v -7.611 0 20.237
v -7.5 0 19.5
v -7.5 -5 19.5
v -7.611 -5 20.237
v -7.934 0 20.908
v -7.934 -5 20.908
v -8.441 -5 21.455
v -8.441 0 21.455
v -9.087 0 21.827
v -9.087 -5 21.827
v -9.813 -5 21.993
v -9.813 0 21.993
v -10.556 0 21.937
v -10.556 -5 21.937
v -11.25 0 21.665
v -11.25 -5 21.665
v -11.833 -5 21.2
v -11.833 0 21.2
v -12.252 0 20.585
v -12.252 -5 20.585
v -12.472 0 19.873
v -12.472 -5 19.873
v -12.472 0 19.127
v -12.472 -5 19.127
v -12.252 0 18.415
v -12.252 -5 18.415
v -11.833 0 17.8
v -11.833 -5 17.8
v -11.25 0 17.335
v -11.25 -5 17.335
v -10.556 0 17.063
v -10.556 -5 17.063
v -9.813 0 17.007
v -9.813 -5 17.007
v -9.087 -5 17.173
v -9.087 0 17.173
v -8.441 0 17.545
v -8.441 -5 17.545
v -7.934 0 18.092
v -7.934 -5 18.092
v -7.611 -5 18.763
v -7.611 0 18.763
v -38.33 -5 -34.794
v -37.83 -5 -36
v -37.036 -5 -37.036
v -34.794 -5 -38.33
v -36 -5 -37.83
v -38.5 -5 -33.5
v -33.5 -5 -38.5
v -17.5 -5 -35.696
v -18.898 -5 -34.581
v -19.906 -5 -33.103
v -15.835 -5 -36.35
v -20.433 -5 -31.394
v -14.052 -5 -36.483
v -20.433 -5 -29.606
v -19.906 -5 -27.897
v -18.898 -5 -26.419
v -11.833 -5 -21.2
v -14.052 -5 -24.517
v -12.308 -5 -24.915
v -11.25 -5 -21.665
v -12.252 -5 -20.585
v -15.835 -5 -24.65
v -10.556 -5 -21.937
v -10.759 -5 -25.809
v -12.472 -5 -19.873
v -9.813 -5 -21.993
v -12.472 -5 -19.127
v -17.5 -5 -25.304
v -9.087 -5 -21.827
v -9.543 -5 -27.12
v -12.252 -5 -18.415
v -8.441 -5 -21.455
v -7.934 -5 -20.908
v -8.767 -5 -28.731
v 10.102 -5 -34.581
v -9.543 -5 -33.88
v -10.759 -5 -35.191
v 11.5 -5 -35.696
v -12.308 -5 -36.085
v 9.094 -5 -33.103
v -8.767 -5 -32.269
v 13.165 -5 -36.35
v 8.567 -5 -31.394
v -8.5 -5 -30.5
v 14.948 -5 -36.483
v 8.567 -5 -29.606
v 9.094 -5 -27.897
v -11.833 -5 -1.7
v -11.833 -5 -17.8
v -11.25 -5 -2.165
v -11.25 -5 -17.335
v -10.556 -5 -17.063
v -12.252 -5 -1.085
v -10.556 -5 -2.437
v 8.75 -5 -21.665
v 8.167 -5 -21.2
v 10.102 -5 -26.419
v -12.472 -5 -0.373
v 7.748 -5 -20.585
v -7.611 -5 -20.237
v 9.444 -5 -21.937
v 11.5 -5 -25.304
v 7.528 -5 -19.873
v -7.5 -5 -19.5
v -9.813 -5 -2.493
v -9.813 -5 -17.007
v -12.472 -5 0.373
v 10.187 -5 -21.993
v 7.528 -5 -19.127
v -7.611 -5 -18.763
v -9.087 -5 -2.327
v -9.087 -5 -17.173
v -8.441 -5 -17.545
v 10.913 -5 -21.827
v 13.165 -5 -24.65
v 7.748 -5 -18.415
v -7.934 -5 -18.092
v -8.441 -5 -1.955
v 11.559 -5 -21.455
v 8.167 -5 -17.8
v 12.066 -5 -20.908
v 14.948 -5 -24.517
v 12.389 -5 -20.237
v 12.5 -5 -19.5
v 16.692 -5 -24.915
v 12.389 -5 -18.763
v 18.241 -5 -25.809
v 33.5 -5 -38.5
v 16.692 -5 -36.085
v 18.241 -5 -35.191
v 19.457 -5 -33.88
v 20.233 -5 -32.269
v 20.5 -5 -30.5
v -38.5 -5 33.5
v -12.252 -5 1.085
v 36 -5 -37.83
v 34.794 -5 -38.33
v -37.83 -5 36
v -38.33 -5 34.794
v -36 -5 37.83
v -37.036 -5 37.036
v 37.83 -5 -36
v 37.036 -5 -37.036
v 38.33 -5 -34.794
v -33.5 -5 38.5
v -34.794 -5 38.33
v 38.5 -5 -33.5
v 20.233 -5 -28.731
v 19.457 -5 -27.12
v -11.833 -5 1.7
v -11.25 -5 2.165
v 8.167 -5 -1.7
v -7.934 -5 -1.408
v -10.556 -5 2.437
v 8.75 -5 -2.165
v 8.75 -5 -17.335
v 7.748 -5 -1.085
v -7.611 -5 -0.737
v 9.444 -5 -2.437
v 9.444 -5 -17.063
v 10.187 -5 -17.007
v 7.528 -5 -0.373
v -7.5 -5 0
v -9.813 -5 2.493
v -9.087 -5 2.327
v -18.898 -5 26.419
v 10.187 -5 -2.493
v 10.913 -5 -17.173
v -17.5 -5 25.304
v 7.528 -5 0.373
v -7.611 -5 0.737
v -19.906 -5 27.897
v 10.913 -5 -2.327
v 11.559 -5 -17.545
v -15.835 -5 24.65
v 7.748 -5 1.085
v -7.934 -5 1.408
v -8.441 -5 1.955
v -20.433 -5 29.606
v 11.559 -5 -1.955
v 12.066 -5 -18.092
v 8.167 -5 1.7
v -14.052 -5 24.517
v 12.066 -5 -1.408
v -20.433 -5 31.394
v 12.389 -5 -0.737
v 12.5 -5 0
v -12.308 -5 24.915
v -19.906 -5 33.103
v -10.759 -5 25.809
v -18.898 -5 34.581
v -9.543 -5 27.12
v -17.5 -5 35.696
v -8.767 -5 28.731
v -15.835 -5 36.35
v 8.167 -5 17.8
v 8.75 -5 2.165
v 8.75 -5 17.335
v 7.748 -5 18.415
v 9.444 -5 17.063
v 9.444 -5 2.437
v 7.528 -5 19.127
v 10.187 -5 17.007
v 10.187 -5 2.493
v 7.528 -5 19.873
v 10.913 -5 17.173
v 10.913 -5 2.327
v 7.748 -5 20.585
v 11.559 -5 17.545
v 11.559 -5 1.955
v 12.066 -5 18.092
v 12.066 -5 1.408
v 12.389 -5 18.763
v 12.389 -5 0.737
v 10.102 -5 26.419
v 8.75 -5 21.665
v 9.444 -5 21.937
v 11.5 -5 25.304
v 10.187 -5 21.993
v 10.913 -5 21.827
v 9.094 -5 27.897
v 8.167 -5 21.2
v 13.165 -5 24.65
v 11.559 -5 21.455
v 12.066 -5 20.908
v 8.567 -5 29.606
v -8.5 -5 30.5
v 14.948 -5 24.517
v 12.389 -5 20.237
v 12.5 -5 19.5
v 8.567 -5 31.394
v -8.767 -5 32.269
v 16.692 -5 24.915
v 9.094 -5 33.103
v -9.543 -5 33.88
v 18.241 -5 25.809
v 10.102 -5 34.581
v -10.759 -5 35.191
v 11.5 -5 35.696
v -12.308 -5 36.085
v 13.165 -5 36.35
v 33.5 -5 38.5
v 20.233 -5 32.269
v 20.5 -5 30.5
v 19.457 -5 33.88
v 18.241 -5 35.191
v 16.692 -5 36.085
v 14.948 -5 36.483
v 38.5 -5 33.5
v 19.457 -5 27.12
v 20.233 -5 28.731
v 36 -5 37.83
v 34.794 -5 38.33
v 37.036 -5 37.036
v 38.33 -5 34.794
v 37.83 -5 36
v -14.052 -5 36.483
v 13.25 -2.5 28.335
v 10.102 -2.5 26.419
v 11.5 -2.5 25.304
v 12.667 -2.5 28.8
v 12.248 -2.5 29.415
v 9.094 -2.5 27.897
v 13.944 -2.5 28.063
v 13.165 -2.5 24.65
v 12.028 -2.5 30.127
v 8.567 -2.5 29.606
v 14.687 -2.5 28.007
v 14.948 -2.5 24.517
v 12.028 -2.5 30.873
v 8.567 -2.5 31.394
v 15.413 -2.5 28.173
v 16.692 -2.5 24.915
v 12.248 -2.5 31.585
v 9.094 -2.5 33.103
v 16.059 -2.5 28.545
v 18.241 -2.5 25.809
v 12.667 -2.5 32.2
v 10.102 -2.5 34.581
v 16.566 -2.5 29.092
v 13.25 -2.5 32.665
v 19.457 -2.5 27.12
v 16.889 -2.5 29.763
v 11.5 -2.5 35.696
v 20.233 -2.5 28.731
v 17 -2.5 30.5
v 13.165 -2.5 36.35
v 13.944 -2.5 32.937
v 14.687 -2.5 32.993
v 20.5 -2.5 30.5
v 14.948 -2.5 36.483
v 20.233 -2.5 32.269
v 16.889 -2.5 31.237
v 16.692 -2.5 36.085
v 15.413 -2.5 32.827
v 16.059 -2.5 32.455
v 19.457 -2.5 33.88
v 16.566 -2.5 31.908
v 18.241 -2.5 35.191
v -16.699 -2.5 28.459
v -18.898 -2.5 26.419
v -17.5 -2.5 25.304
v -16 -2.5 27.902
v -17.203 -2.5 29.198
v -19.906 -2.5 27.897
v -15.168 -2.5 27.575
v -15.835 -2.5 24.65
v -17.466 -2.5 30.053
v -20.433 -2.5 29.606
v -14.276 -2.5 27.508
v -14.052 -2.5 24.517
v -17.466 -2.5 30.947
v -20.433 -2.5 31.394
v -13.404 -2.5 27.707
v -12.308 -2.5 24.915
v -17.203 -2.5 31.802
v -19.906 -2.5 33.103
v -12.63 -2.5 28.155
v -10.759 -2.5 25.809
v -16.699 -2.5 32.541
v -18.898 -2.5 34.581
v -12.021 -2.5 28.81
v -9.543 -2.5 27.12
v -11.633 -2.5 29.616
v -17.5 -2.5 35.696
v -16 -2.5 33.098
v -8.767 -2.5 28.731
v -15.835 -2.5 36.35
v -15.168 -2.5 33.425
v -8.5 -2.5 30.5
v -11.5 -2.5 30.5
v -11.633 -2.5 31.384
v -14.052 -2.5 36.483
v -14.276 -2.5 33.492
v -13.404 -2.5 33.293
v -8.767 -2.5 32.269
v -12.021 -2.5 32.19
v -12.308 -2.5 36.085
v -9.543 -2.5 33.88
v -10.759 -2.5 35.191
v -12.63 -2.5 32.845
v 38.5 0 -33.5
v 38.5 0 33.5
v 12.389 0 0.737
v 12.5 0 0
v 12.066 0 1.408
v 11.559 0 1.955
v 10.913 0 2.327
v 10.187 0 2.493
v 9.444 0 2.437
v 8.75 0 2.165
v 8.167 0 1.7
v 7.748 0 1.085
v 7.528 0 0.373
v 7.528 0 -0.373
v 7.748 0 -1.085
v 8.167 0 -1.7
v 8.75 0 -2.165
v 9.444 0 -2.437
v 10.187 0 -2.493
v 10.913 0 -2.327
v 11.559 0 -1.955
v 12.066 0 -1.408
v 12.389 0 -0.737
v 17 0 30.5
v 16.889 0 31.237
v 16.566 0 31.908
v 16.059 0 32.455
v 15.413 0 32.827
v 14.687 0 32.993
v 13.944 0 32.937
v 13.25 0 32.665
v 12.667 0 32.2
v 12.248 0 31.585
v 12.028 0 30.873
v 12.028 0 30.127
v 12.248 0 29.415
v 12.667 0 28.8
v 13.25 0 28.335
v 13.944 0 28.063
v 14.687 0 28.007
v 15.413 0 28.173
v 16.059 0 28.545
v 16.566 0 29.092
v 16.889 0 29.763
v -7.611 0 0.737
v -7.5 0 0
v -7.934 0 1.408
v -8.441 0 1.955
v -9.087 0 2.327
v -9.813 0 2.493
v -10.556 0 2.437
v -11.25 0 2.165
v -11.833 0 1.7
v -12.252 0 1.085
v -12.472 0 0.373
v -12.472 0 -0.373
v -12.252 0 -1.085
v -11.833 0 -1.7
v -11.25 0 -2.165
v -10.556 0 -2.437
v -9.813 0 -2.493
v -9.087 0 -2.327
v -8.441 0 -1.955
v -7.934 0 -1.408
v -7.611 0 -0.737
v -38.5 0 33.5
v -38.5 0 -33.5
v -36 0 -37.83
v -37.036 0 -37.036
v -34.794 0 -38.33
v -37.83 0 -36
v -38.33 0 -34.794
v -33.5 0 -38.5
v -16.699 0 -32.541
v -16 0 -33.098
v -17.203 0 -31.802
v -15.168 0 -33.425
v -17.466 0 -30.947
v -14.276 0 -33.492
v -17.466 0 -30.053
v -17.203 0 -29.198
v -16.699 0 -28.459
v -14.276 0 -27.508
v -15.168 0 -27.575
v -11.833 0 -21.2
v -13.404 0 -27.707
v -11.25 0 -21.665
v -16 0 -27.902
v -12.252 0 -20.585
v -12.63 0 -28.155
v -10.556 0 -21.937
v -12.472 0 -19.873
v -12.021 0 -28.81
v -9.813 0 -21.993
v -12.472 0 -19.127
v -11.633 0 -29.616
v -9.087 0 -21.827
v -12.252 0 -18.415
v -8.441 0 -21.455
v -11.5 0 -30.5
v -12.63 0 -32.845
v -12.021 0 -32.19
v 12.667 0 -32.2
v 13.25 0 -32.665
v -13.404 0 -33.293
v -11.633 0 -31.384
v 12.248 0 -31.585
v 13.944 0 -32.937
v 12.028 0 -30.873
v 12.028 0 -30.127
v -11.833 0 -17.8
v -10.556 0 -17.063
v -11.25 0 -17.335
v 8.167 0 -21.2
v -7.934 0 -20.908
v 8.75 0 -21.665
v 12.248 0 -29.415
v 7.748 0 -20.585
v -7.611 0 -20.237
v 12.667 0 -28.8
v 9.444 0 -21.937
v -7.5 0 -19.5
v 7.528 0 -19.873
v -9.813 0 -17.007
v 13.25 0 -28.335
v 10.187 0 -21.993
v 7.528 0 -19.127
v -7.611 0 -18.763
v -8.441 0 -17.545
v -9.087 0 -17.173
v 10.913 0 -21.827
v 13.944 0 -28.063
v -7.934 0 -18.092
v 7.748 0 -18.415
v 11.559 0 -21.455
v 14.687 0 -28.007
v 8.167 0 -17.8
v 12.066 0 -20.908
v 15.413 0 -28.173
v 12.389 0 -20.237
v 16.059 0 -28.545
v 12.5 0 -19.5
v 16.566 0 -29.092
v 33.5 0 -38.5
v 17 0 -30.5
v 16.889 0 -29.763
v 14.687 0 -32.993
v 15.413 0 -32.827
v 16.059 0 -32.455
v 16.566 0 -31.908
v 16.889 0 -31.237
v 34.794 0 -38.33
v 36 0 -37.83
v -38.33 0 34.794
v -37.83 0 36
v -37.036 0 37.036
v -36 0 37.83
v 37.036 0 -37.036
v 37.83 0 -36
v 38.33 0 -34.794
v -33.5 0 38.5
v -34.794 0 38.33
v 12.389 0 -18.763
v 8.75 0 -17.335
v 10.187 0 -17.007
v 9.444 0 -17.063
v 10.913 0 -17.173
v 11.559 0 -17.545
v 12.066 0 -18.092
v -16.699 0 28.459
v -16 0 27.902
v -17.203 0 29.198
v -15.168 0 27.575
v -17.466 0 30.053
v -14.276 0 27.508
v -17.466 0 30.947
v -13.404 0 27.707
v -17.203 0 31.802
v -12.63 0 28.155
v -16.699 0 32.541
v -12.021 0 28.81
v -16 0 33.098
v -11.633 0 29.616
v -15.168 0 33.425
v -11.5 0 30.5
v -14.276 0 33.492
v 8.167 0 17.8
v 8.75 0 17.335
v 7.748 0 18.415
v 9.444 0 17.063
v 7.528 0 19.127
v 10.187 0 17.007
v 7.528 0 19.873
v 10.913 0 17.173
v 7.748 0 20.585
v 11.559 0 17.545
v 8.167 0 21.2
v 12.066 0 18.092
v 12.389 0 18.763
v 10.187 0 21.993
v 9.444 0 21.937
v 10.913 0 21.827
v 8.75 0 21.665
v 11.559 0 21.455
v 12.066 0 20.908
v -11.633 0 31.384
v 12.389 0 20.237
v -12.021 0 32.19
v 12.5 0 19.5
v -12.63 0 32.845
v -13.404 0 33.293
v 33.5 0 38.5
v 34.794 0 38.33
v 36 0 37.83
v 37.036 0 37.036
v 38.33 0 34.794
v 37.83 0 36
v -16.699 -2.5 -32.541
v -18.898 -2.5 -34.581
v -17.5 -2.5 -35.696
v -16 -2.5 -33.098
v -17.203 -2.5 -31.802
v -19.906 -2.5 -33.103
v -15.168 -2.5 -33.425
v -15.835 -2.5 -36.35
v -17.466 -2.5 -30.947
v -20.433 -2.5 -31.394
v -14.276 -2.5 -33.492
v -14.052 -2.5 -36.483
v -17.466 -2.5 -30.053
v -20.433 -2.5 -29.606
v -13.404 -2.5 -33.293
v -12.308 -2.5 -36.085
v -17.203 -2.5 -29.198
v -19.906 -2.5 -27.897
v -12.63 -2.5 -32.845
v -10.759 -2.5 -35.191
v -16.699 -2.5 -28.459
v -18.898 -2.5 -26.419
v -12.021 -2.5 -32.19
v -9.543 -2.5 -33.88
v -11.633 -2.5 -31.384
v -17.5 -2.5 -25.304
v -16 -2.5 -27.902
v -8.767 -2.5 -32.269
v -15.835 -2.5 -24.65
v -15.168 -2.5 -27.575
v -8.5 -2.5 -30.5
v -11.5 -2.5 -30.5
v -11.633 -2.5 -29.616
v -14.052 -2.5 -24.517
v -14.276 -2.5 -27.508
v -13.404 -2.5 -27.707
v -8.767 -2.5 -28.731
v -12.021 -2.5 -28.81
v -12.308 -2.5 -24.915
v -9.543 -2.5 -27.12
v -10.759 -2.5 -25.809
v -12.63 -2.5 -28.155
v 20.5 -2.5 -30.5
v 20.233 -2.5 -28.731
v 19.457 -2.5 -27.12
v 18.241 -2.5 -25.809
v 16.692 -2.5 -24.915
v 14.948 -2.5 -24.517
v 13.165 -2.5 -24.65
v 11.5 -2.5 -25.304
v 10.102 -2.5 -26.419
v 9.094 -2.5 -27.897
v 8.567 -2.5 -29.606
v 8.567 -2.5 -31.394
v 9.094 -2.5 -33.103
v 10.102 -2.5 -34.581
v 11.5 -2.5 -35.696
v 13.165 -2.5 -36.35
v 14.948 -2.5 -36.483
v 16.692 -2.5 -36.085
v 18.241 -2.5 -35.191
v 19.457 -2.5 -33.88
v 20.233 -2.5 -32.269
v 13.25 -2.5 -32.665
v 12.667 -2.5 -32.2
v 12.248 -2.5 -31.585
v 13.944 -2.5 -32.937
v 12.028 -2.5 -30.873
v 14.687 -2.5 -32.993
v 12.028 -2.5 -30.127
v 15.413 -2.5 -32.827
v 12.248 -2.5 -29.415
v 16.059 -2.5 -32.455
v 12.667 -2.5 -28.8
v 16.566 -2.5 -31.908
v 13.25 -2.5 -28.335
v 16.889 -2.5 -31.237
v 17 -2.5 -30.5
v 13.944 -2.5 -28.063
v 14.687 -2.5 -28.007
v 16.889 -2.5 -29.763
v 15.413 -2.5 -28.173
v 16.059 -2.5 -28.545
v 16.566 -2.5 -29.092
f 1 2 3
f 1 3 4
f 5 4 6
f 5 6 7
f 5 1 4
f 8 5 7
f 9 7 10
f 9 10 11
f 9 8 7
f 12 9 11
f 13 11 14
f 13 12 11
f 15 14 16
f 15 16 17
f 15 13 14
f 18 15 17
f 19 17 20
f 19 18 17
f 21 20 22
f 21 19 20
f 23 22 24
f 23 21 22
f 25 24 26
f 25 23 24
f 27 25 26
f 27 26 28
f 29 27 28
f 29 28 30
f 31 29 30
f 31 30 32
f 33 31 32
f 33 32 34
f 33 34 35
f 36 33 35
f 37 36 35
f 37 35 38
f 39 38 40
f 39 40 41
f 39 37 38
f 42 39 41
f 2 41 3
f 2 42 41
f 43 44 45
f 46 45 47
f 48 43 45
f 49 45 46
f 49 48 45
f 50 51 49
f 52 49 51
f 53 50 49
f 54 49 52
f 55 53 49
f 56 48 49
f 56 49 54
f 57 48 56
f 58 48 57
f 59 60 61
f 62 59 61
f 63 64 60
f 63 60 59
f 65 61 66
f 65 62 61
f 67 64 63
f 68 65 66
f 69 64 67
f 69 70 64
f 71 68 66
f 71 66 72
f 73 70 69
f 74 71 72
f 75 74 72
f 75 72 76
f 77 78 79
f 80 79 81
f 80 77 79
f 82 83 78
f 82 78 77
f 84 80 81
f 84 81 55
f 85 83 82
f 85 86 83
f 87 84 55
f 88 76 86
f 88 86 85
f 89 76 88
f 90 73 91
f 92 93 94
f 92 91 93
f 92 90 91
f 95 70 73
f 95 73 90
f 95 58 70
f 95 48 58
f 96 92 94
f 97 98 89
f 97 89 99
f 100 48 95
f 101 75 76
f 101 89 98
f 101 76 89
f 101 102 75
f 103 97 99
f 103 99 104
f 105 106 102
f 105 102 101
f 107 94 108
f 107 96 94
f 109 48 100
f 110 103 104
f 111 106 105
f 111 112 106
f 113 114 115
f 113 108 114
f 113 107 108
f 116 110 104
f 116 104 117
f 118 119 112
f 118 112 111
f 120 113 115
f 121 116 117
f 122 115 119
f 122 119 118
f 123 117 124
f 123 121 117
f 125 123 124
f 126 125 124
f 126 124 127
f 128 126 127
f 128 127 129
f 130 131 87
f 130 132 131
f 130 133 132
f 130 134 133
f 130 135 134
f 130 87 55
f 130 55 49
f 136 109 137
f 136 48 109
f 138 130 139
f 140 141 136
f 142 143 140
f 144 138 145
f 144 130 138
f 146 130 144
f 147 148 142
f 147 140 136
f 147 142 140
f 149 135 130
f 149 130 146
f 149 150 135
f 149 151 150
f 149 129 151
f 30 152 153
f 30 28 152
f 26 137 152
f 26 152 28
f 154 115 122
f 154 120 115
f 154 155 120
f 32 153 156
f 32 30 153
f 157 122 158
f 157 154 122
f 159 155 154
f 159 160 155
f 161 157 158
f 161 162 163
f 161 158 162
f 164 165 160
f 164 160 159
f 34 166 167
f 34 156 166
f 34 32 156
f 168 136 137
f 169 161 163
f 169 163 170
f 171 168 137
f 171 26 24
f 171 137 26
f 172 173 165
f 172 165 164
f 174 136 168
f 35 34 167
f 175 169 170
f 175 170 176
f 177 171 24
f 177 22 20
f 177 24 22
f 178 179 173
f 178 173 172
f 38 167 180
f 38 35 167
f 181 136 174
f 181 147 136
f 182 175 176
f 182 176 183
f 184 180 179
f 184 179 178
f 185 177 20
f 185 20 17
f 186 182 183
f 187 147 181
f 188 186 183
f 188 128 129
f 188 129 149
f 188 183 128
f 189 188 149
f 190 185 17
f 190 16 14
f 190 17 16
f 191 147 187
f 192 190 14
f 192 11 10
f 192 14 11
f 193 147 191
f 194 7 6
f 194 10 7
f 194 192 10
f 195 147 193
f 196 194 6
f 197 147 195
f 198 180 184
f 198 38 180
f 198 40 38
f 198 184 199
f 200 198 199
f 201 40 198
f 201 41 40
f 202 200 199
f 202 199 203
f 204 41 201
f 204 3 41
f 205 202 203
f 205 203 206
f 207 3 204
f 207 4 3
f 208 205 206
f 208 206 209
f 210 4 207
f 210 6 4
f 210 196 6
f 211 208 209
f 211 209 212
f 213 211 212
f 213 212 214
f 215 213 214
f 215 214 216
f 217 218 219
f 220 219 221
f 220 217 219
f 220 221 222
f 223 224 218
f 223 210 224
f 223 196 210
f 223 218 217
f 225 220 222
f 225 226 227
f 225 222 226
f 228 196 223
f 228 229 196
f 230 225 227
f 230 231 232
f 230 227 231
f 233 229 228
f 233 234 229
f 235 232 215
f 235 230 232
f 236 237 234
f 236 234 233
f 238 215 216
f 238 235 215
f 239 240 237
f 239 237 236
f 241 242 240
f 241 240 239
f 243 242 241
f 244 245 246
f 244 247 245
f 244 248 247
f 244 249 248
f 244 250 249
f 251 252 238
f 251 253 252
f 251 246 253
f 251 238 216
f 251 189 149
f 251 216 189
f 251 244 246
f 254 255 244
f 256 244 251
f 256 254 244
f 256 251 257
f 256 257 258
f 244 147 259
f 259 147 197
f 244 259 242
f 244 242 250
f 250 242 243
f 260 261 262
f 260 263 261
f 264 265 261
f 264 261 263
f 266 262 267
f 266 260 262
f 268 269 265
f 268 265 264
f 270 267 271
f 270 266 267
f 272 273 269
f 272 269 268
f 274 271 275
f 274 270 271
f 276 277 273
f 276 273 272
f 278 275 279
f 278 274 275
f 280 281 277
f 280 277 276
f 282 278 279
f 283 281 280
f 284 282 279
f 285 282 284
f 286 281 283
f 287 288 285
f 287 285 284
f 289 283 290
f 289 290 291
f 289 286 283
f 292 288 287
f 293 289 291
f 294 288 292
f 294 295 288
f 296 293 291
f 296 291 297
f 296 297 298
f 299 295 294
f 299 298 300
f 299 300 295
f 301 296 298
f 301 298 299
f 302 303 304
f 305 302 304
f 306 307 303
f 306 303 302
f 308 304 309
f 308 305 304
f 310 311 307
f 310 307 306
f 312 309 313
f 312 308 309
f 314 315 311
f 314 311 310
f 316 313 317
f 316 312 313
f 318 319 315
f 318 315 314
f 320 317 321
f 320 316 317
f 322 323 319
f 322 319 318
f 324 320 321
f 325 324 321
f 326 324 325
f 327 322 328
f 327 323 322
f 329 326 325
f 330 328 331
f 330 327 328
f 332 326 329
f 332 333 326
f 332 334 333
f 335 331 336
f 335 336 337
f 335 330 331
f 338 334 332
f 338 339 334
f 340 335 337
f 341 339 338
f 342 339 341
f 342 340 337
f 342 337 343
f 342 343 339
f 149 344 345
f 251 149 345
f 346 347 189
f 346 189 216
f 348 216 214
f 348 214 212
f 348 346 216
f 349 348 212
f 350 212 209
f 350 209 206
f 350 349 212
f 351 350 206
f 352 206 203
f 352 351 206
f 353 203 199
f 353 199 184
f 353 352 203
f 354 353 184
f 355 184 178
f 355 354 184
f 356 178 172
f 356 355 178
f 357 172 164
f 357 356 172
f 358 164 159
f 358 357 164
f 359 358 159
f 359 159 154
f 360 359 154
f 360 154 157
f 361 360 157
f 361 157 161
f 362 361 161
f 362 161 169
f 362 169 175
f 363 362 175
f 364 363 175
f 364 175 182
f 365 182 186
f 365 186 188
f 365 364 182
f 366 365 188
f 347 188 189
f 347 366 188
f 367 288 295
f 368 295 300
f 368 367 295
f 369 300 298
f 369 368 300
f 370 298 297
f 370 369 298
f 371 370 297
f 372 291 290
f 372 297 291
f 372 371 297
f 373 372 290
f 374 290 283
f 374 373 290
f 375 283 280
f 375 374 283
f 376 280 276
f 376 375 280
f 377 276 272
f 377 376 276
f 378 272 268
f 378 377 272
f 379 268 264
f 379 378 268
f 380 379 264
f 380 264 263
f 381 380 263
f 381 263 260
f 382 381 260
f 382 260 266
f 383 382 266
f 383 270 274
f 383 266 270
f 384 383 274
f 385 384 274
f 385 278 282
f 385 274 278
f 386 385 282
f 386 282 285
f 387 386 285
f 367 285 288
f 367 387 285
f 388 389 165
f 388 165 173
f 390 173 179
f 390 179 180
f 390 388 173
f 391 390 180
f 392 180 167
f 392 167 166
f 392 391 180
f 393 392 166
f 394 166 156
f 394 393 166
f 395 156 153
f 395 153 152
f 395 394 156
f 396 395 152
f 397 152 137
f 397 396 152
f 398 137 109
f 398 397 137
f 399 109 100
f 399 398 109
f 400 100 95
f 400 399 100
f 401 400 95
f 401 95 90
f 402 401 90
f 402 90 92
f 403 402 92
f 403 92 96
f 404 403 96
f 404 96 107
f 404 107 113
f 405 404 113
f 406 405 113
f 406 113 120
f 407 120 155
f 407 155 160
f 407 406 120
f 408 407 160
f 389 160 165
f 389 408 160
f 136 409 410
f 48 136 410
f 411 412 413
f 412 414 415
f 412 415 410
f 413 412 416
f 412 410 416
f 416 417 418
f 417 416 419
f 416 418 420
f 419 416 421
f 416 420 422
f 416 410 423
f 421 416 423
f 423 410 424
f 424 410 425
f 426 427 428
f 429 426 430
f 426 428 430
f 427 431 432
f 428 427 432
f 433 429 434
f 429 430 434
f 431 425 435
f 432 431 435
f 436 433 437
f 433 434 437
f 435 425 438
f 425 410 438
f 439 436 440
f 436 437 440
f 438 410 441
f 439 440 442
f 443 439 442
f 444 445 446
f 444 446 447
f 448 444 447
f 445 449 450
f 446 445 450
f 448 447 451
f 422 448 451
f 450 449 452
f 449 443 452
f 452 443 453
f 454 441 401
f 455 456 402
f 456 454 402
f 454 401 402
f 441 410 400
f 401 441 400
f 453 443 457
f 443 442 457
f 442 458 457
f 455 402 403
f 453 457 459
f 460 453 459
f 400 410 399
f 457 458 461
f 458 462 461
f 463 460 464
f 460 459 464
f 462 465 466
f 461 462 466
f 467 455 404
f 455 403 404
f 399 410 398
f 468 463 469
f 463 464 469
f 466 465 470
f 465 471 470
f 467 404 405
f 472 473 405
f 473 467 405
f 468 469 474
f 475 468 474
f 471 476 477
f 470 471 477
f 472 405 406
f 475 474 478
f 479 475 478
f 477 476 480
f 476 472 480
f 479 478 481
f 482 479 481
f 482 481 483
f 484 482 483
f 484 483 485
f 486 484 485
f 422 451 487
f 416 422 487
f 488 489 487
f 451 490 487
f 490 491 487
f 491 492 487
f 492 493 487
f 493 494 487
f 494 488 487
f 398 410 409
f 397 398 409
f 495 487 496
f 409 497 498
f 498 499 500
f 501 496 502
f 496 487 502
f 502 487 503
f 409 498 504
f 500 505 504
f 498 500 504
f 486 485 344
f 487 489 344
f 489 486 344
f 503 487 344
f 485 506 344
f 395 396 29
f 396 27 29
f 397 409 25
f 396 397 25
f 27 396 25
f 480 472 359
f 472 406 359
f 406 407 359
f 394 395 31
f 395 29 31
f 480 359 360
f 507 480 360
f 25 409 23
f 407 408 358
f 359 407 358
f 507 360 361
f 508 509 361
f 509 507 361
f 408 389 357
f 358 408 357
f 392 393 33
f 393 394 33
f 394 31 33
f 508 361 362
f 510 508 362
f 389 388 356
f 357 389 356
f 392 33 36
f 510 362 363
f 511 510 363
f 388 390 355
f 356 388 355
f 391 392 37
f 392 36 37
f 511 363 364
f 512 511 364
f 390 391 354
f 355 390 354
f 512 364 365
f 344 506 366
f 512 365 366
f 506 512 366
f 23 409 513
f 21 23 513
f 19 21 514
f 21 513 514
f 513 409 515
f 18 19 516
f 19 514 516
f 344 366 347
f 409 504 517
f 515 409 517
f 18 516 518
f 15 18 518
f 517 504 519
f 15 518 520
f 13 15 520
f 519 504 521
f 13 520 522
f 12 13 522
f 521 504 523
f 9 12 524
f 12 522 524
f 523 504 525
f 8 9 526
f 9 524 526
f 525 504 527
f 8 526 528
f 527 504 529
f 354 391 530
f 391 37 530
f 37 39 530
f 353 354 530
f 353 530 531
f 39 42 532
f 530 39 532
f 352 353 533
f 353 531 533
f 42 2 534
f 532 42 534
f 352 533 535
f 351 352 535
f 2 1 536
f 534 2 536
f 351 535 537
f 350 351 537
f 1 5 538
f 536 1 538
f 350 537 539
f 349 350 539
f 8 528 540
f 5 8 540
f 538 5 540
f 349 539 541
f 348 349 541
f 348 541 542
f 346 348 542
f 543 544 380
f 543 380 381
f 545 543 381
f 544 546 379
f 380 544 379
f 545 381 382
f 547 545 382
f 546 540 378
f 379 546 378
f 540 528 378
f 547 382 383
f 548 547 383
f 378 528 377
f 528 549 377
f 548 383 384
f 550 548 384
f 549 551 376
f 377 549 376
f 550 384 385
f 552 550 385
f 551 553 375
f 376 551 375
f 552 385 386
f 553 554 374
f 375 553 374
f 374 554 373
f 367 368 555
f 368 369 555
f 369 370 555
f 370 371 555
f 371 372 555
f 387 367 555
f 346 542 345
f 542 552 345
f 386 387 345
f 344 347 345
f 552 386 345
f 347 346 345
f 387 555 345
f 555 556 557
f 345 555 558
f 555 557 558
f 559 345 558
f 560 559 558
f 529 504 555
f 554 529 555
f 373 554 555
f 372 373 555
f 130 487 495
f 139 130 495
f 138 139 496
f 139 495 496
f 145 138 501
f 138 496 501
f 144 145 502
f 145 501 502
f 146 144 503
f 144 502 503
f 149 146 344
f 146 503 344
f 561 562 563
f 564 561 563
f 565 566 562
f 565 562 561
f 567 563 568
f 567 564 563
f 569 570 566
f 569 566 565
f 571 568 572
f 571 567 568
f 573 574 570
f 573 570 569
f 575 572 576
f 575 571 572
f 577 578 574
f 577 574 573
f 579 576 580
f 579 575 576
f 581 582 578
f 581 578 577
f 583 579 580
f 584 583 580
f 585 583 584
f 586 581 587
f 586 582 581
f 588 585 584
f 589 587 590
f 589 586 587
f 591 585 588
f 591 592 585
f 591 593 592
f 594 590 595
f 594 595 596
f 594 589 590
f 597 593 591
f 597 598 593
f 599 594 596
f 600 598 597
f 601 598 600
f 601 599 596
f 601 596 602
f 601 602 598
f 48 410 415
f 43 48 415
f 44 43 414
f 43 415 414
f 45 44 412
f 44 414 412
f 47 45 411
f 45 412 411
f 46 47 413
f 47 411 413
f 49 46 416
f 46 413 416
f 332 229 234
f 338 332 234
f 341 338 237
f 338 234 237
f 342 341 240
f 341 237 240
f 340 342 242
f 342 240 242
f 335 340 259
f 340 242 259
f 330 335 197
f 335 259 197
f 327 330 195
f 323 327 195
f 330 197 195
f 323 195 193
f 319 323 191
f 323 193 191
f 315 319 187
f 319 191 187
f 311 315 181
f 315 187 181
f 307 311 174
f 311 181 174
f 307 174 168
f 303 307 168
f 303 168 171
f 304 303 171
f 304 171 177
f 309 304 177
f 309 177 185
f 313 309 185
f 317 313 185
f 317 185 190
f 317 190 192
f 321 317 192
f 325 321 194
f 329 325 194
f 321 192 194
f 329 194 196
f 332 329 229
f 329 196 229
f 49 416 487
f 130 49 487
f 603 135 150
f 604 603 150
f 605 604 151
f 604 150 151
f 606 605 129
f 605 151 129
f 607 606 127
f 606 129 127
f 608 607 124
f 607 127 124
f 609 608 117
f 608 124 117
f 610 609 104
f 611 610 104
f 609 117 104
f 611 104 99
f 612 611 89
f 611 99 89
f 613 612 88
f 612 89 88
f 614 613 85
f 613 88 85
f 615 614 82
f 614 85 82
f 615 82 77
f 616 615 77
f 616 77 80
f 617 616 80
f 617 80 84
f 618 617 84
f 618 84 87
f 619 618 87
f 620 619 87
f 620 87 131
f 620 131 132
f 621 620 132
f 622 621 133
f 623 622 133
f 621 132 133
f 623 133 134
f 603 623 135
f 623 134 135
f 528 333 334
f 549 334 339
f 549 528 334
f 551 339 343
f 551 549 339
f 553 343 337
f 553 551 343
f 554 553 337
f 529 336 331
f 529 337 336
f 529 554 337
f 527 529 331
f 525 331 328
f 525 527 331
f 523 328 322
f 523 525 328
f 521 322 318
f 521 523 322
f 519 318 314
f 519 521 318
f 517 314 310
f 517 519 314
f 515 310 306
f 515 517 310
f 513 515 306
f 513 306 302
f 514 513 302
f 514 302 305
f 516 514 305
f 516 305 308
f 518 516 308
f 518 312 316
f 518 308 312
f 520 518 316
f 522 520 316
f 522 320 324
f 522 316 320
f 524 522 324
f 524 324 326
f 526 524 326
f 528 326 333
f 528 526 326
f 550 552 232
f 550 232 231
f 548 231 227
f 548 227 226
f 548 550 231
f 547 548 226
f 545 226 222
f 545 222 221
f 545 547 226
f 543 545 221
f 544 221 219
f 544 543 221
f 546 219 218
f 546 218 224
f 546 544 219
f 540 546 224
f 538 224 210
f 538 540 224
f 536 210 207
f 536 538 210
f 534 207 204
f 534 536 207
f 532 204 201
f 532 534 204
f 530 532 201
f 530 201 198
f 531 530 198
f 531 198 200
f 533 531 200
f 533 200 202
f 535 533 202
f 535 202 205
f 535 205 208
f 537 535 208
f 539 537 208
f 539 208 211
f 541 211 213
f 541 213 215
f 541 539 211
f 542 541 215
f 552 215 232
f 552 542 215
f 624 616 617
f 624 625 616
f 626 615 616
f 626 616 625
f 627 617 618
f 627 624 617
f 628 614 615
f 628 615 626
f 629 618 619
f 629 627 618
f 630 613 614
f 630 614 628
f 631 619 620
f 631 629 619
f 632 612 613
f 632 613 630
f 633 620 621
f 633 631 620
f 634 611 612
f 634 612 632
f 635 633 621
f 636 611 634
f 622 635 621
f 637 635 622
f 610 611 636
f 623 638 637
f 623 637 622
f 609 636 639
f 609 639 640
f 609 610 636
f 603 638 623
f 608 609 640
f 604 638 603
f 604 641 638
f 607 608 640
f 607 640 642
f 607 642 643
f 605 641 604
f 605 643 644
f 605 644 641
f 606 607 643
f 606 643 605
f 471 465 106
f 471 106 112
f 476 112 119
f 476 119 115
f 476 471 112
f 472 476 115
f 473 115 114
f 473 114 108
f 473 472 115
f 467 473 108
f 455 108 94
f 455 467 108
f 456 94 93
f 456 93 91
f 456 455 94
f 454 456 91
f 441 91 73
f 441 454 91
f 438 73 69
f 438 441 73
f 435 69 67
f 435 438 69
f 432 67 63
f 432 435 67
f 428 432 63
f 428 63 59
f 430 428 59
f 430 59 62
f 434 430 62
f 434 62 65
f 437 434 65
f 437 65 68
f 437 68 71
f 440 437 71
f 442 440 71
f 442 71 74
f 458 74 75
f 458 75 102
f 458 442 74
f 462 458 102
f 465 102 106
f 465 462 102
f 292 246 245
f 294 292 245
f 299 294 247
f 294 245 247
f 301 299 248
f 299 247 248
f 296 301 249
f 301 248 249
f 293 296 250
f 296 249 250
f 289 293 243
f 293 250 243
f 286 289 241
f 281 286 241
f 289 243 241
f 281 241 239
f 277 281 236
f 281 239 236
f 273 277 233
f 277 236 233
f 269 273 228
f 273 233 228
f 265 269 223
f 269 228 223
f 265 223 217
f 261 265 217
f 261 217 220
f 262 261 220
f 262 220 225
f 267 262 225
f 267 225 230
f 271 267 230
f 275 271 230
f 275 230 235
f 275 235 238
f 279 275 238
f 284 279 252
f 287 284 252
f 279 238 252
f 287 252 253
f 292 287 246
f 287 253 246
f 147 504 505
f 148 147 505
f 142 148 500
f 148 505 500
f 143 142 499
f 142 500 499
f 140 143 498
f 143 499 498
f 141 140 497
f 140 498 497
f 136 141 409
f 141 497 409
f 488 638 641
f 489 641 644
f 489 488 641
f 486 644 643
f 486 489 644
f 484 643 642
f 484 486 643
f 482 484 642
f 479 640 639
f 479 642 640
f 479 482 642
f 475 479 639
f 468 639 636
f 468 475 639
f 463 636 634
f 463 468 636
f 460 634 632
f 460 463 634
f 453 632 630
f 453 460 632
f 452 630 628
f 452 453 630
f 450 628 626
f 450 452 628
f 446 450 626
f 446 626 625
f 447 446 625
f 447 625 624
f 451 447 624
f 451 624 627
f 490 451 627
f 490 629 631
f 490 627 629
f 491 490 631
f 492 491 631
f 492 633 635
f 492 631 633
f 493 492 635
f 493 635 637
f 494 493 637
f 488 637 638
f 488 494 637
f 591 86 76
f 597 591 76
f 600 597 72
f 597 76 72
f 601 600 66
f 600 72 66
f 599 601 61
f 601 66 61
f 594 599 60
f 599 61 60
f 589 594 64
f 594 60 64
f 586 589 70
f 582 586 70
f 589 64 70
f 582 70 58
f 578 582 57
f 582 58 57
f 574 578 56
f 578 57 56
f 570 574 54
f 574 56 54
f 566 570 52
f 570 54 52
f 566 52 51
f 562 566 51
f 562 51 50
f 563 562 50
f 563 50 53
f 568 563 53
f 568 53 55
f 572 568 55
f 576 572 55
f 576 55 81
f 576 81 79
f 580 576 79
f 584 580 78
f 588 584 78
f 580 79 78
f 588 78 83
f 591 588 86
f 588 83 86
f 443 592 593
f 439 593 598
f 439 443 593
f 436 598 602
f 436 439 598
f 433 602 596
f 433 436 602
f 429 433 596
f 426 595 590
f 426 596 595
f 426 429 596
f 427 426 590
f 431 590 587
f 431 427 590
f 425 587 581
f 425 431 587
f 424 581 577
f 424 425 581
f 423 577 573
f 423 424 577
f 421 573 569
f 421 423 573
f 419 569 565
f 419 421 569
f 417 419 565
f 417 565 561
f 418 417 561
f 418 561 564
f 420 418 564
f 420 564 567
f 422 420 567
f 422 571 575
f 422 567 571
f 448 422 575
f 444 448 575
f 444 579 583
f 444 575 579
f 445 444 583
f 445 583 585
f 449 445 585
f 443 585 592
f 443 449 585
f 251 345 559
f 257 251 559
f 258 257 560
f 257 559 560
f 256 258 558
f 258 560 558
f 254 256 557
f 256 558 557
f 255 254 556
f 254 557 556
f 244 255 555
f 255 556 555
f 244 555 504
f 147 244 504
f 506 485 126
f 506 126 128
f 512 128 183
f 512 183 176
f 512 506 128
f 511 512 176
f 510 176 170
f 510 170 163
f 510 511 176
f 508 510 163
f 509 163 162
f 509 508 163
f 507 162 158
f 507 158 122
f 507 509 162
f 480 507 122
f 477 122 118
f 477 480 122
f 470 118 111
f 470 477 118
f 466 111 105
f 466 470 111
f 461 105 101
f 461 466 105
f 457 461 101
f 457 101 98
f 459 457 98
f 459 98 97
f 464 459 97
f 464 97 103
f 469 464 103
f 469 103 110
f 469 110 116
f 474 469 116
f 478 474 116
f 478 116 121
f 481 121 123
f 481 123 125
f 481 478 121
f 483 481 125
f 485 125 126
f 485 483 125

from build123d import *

# Parameters (mm, degrees)
F0_R     = 3
F0_R_2   = 2.5
F1_DEPTH = 5
F2_R     = 6
F3_DEPTH = 2.5


with BuildPart() as f1:
    # F0 (on Front) → F1 (new body)
    with BuildSketch(Plane.XZ):
        with BuildLine():
            ThreePointArc((-38.5, -33.5), (-37.035534, -37.035534), (-33.5, -38.5))
            Line((-33.5, -38.5), (33.5, -38.5))
            ThreePointArc((33.5, -38.5), (37.035534, -37.035534), (38.5, -33.5))
            Line((38.5, -33.5), (38.5, 33.5))
            ThreePointArc((38.5, 33.5), (37.035534, 37.035534), (33.5, 38.5))
            Line((33.5, 38.5), (-33.5, 38.5))
            ThreePointArc((-33.5, 38.5), (-37.035534, 37.035534), (-38.5, 33.5))
            Line((-38.5, 33.5), (-38.5, -33.5))
        make_face()
        with Locations((-14.5, -30.5)):
            Circle(F0_R, mode=Mode.SUBTRACT)
        with Locations((-10, -19.5)):
            Circle(F0_R_2, mode=Mode.SUBTRACT)
        with Locations((14.5, -30.5)):
            Circle(F0_R_2, mode=Mode.SUBTRACT)
        with Locations((10, -19.5)):
            Circle(F0_R_2, mode=Mode.SUBTRACT)
        with Locations((-10, 0)):
            Circle(F0_R_2, mode=Mode.SUBTRACT)
        with Locations((-10, 19.5)):
            Circle(F0_R_2, mode=Mode.SUBTRACT)
        with Locations((-14.5, 30.5)):
            Circle(F0_R, mode=Mode.SUBTRACT)
        with Locations((10, 0)):
            Circle(F0_R_2, mode=Mode.SUBTRACT)
        with Locations((10, 19.5)):
            Circle(F0_R_2, mode=Mode.SUBTRACT)
        with Locations((14.5, 30.5)):
            Circle(F0_R_2, mode=Mode.SUBTRACT)
    extrude(amount=F1_DEPTH)

    # F2 (on face) → F3 (cut)
    with BuildSketch(Plane.XZ.offset(5)):
        with Locations((-14.5, 30.5)):
            Circle(F2_R)
        with Locations((-14.5, -30.5)):
            Circle(F2_R)
        with Locations((14.5, 30.5)):
            Circle(F2_R)
        with Locations((14.5, -30.5)):
            Circle(F2_R)
    extrude(amount=-F3_DEPTH, mode=Mode.SUBTRACT)


solid = f1.part
